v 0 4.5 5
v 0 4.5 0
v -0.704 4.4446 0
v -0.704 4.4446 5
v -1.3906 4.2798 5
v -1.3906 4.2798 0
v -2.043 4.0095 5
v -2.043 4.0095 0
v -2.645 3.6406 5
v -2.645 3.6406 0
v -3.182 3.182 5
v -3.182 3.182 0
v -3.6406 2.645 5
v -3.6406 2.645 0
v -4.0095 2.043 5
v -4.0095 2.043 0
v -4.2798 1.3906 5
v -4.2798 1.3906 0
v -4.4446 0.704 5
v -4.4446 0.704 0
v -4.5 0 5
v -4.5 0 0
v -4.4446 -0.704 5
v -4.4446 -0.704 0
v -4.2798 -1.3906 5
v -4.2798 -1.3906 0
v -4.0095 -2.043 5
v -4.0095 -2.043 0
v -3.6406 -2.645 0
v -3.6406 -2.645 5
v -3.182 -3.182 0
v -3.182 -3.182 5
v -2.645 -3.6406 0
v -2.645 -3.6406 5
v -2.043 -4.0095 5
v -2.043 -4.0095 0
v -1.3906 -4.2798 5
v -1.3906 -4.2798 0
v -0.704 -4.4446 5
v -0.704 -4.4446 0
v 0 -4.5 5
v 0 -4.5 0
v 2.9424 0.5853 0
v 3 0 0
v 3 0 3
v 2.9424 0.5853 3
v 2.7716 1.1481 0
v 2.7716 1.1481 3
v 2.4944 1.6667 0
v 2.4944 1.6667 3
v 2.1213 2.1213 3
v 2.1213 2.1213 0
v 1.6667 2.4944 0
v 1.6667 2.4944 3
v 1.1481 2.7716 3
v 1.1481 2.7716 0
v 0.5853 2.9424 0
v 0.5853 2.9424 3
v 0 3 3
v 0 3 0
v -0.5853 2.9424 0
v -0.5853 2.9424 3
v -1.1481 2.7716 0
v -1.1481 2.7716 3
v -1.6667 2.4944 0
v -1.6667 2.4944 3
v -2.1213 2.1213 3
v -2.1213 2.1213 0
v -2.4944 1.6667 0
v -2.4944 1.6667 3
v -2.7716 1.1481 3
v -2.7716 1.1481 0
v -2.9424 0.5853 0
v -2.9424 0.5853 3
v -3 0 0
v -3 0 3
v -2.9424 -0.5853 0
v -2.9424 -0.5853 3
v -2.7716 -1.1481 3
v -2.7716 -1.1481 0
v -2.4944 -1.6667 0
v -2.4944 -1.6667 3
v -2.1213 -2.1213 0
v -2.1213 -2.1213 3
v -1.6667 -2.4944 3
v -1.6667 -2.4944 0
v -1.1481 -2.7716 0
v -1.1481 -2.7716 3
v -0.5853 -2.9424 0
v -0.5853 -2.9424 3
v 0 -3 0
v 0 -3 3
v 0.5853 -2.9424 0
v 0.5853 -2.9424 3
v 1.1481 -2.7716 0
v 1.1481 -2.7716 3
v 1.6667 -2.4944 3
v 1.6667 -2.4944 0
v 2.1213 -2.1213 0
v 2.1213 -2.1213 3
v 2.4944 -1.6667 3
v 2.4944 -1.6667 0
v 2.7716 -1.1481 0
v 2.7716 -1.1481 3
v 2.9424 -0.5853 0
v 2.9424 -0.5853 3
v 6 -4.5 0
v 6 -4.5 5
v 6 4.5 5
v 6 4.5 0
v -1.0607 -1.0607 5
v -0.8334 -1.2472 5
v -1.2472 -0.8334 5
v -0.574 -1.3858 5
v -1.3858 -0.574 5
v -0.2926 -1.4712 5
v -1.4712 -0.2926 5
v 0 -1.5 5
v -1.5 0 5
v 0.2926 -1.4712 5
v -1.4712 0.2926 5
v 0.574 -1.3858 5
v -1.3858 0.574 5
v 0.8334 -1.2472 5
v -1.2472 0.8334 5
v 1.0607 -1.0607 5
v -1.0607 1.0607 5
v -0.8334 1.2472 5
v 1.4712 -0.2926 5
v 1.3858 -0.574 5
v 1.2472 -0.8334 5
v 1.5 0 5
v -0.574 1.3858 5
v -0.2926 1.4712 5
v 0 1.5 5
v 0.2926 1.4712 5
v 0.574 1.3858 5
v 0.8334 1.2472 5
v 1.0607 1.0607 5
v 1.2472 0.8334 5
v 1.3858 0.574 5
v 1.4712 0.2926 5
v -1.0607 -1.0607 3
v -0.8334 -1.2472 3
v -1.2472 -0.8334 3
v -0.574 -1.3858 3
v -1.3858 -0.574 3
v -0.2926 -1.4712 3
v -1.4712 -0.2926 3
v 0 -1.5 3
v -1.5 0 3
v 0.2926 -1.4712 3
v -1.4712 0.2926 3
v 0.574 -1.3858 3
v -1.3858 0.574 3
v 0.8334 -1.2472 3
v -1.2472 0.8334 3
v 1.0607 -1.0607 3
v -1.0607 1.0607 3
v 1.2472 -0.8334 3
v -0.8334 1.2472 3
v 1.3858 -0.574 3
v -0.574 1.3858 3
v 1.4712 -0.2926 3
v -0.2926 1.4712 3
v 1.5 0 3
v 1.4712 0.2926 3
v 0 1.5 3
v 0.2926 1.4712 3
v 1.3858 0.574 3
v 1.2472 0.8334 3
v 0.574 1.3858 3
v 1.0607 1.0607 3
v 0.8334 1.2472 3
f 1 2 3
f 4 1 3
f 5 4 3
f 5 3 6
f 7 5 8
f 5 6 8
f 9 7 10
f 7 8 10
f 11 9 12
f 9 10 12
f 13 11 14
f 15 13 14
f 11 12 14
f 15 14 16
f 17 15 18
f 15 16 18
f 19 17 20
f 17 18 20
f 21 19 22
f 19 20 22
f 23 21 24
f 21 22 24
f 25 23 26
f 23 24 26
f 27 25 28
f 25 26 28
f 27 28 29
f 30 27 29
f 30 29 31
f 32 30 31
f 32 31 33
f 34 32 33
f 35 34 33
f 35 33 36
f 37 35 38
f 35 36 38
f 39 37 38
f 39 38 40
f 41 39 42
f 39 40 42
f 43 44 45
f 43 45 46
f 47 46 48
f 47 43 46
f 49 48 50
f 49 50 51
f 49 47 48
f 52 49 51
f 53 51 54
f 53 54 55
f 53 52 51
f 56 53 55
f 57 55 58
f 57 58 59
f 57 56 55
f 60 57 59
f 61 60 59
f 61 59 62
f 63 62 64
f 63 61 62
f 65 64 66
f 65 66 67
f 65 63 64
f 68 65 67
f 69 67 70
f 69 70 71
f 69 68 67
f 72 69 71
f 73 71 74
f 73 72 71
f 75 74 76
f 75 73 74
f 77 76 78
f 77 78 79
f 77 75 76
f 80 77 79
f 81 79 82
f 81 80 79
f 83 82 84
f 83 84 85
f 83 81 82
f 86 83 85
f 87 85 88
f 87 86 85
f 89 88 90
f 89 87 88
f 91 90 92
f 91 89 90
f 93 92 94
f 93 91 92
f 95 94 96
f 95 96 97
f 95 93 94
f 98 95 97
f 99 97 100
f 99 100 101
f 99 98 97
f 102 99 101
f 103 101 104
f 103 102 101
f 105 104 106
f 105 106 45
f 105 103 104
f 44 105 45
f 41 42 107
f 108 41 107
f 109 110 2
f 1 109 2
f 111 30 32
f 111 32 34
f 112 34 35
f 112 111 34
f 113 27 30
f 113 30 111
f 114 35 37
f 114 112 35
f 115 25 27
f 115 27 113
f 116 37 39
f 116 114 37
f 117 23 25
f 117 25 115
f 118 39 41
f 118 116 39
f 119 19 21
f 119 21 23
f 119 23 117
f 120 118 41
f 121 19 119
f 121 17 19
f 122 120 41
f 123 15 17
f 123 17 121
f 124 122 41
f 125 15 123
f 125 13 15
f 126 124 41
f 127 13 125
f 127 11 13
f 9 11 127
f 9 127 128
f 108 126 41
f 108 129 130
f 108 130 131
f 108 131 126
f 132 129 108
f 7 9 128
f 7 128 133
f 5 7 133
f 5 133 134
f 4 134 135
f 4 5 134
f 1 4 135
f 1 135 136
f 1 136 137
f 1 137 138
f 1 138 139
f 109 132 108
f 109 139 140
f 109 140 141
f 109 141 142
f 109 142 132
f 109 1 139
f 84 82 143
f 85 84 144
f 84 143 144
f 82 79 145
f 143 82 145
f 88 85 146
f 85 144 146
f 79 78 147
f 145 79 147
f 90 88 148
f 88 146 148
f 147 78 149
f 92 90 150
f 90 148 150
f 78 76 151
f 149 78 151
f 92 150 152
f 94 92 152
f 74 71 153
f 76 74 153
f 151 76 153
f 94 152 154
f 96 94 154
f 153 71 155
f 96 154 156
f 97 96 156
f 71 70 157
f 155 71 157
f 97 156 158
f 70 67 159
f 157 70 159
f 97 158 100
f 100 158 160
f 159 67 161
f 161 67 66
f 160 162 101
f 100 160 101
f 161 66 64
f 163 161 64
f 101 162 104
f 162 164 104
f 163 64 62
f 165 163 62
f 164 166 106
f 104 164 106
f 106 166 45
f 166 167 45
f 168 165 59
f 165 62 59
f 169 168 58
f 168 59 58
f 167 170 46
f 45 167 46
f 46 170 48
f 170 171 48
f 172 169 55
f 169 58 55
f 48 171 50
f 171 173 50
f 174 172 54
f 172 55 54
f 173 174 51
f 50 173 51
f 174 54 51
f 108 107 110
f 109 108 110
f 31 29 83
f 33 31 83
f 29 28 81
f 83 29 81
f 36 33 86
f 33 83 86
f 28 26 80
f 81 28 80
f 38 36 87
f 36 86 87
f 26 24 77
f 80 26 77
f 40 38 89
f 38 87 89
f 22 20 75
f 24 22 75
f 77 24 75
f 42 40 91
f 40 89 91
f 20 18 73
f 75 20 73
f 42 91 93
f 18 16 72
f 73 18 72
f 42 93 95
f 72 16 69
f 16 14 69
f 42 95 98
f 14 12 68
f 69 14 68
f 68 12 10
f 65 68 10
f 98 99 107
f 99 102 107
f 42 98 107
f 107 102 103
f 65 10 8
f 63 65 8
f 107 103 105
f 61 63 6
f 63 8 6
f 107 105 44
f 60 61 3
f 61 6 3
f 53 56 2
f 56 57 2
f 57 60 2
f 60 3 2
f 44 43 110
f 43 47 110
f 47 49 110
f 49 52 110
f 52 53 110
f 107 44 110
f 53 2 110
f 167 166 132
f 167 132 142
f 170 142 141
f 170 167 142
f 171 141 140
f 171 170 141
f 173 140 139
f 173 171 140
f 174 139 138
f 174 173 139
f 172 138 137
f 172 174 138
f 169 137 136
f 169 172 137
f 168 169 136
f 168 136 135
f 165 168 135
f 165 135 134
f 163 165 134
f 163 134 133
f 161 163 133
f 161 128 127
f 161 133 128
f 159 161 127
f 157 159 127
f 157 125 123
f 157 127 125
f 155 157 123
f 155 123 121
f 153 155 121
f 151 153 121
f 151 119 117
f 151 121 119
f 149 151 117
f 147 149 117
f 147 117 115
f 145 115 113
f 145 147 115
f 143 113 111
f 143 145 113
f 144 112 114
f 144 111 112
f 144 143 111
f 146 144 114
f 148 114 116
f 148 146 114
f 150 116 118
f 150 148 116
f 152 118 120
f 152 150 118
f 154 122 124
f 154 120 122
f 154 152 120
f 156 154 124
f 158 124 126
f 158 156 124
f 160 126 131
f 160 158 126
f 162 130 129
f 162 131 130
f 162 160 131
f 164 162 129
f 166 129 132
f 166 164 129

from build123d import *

# Parameters (mm, degrees)
F1_DEPTH = 5
F2_R     = 1.5
F3_DEPTH = 18.5
F4_R     = 3
F5_DEPTH = 3


with BuildPart() as f1:
    # F0 (on Top) → F1 (new body)
    with BuildSketch(Plane.XY):
        with BuildLine():
            ThreePointArc((0, 4.5), (3.181981, 3.181981), (4.5, 0))
            ThreePointArc((4.5, 0), (3.181981, -3.181981), (0, -4.5))
            Line((0, -4.5), (6, -4.5))
            Line((6, -4.5), (6, 4.5))
            Line((6, 4.5), (0, 4.5))
        make_face()
        with BuildLine():
            ThreePointArc((0, -4.5), (3.181981, -3.181981), (4.5, 0))
            ThreePointArc((4.5, 0), (3.181981, 3.181981), (0, 4.5))
            ThreePointArc((0, 4.5), (-4.5, 0), (0, -4.5))
        make_face()
    extrude(amount=F1_DEPTH)

    # F2 (on Top) → F3 (cut)
    with BuildSketch(Plane.XY):
        Circle(F2_R)
    extrude(amount=F3_DEPTH, mode=Mode.SUBTRACT)

    # F4 (on Top) → F5 (cut)
    with BuildSketch(Plane.XY):
        Circle(F4_R)
    extrude(amount=F5_DEPTH, mode=Mode.SUBTRACT)


solid = f1.part
